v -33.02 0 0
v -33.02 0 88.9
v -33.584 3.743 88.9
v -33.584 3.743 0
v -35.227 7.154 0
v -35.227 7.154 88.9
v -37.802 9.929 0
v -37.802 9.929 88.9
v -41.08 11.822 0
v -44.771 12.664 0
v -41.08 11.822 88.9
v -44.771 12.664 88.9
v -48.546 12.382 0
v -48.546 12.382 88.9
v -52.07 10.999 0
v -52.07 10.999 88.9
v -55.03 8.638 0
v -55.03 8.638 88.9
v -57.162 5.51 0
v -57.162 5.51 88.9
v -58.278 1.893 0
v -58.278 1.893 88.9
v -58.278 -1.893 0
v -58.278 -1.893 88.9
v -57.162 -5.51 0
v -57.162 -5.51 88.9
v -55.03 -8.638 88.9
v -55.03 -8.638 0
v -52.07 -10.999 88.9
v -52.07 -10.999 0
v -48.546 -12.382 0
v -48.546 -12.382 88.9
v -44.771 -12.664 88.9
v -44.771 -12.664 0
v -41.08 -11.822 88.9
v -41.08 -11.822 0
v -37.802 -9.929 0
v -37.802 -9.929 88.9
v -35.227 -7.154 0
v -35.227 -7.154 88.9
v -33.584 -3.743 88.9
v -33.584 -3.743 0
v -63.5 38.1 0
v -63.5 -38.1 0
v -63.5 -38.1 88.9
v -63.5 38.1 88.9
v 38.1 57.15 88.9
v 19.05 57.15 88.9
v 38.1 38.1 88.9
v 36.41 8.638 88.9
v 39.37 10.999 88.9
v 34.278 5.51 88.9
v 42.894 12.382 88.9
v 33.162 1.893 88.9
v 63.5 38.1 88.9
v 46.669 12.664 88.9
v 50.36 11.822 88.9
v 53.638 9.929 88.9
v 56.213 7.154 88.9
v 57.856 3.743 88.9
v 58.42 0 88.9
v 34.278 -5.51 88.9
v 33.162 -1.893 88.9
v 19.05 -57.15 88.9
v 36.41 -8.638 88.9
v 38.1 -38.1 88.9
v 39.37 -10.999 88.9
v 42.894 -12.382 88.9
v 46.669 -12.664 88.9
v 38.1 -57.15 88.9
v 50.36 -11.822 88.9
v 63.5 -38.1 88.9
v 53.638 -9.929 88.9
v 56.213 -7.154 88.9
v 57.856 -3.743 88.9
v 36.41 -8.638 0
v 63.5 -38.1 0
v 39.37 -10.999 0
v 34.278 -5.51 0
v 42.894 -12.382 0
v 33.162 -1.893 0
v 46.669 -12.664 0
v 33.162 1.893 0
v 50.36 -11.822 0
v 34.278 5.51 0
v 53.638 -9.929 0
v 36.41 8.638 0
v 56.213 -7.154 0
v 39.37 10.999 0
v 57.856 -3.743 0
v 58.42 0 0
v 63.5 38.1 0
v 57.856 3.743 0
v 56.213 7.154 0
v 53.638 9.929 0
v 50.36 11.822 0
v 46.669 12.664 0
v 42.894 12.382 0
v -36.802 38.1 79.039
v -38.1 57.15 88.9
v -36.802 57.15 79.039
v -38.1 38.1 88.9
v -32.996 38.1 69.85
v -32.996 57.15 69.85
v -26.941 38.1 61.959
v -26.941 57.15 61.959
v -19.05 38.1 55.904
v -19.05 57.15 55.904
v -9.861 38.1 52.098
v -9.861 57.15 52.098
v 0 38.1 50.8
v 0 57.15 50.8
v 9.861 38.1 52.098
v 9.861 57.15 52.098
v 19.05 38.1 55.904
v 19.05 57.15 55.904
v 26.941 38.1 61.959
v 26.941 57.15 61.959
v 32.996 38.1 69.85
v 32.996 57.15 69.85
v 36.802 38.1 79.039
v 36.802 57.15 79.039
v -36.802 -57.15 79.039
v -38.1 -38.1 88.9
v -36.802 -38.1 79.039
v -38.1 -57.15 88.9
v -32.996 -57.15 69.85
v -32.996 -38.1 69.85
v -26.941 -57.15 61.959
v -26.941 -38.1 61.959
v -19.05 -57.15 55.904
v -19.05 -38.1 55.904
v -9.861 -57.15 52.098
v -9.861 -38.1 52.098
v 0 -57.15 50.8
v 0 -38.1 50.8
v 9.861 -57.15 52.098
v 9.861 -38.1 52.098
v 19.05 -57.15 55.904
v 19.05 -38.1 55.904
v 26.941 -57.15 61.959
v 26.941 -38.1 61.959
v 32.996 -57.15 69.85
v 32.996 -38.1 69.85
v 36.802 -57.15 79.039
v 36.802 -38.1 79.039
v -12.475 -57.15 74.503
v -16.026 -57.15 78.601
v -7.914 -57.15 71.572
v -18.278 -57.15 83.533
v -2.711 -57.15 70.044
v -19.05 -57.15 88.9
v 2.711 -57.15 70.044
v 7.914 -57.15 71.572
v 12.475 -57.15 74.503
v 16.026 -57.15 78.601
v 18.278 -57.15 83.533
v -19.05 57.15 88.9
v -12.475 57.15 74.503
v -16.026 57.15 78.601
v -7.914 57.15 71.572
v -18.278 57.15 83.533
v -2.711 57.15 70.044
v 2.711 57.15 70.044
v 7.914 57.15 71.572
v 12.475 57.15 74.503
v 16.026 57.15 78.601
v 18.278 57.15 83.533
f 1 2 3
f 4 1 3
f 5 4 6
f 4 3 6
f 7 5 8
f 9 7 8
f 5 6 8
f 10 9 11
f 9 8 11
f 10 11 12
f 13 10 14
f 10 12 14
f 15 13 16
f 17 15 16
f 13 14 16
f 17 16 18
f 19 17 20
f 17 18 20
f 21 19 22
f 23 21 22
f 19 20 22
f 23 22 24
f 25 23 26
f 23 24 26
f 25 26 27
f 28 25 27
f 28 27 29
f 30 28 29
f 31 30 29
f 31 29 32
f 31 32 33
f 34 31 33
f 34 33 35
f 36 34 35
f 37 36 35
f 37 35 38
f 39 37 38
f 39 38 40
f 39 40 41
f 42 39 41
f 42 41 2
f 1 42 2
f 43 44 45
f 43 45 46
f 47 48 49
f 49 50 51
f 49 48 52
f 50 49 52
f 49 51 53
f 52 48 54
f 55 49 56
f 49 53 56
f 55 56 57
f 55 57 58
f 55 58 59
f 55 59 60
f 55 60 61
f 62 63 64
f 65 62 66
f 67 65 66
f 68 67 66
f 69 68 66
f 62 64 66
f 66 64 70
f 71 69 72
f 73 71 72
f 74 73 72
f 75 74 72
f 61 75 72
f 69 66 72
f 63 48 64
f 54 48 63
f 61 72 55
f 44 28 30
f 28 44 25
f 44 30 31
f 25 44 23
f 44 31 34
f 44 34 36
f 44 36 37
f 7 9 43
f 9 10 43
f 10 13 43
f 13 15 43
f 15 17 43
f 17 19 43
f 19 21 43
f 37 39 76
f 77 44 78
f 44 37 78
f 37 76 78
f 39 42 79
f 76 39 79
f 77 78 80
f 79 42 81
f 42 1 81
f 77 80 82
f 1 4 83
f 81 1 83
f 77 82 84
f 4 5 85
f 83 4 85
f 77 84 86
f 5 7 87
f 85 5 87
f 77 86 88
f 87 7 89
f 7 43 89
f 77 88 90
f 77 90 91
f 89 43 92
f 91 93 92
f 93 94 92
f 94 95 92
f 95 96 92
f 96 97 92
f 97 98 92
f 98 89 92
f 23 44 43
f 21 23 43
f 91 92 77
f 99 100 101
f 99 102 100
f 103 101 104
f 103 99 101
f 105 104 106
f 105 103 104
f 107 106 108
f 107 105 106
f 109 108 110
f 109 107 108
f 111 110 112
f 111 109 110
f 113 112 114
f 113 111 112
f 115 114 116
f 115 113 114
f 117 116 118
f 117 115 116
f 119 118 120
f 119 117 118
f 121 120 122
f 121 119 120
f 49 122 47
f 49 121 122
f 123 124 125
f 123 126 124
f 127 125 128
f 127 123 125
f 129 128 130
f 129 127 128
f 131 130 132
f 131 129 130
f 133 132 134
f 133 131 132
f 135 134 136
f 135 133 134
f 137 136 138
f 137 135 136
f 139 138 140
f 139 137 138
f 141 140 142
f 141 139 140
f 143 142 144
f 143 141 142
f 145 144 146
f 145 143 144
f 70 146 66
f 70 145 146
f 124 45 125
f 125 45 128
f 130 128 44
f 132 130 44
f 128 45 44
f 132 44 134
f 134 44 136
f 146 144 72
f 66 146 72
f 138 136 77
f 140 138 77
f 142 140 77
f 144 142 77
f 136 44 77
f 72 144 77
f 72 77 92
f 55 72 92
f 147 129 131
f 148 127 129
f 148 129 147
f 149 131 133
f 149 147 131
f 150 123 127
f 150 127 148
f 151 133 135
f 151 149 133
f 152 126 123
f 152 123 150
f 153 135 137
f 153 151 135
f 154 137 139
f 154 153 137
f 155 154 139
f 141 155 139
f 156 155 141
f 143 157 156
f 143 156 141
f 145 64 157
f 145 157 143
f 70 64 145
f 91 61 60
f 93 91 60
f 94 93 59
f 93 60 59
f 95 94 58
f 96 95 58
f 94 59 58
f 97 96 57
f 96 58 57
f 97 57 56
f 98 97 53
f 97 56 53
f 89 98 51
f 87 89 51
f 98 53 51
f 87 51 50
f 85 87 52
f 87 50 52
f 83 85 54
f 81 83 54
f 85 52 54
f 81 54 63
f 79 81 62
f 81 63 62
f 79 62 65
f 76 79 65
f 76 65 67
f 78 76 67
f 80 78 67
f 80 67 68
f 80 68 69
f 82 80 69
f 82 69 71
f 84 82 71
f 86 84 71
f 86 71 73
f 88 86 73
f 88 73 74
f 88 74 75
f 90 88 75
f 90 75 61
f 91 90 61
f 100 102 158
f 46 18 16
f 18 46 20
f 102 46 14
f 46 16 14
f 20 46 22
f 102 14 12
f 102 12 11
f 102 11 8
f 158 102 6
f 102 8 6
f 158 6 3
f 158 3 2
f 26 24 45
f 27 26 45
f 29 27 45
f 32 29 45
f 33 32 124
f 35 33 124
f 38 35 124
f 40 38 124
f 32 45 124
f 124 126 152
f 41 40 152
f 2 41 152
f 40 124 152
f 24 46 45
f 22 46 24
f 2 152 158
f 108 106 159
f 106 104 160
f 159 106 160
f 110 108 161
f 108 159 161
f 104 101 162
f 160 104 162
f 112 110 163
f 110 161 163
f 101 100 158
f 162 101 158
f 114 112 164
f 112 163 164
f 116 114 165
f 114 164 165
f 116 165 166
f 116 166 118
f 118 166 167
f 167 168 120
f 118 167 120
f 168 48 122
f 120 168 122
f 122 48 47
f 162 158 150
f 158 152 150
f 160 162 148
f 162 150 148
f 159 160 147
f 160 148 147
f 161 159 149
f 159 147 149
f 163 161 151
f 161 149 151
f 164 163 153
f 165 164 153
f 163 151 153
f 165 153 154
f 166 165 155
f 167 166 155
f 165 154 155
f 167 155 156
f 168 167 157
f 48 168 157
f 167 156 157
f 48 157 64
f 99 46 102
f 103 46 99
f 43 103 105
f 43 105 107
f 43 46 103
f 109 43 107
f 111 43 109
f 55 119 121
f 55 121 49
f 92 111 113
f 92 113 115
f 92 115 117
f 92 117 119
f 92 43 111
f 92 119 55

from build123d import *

# Parameters (mm, degrees)
F0_W     = 127
F0_H     = 76.2
F1_DEPTH = 88.9
F2_R     = 38.1
F3_DEPTH = 57.15
F5_DEPTH = 127
F6_R     = 19.05
F7_DEPTH = 127
F8_R     = 12.7
F9_DEPTH = 88.901


with BuildPart() as f1:
    # F0 (on Top) → F1 (new body)
    with BuildSketch(Plane.XY):
        Rectangle(F0_W, F0_H)
    extrude(amount=F1_DEPTH)

    # F2 (on Front) → F3 (join, symmetric)
    with BuildSketch(Plane.XZ):
        with Locations((0, 88.9)):
            Circle(F2_R)
    extrude(amount=F3_DEPTH, both=True)

    # F4 (on Front) → F5 (cut, symmetric)
    with BuildSketch(Plane.XZ):
        with BuildLine():
            Line((76.654768, 131.578267), (-50.806063, 131.578267))
            Line((-50.806063, 131.578267), (-50.806063, 88.9))
            Line((-50.806063, 88.9), (-19.05, 88.9))
            ThreePointArc((-19.05, 88.9), (0, 107.95), (19.05, 88.9))
            Line((19.05, 88.9), (76.654768, 88.9))
            Line((76.654768, 88.9), (76.654768, 131.578267))
        make_face()
    extrude(amount=F5_DEPTH, both=True, mode=Mode.SUBTRACT)

    # F6 (on Front) → F7 (cut, symmetric)
    with BuildSketch(Plane.XZ):
        with Locations((0, 88.9)):
            Circle(F6_R)
    extrude(amount=F7_DEPTH, both=True, mode=Mode.SUBTRACT)

    # F8 (on face) → F9 (cut, through all)
    with BuildSketch(Plane.XY.offset(88.9)):
        with Locations((-45.72, 0)):
            Circle(F8_R)
        with Locations((45.72, 0)):
            Circle(F8_R)
    extrude(amount=-F9_DEPTH, mode=Mode.SUBTRACT)


solid = f1.part
